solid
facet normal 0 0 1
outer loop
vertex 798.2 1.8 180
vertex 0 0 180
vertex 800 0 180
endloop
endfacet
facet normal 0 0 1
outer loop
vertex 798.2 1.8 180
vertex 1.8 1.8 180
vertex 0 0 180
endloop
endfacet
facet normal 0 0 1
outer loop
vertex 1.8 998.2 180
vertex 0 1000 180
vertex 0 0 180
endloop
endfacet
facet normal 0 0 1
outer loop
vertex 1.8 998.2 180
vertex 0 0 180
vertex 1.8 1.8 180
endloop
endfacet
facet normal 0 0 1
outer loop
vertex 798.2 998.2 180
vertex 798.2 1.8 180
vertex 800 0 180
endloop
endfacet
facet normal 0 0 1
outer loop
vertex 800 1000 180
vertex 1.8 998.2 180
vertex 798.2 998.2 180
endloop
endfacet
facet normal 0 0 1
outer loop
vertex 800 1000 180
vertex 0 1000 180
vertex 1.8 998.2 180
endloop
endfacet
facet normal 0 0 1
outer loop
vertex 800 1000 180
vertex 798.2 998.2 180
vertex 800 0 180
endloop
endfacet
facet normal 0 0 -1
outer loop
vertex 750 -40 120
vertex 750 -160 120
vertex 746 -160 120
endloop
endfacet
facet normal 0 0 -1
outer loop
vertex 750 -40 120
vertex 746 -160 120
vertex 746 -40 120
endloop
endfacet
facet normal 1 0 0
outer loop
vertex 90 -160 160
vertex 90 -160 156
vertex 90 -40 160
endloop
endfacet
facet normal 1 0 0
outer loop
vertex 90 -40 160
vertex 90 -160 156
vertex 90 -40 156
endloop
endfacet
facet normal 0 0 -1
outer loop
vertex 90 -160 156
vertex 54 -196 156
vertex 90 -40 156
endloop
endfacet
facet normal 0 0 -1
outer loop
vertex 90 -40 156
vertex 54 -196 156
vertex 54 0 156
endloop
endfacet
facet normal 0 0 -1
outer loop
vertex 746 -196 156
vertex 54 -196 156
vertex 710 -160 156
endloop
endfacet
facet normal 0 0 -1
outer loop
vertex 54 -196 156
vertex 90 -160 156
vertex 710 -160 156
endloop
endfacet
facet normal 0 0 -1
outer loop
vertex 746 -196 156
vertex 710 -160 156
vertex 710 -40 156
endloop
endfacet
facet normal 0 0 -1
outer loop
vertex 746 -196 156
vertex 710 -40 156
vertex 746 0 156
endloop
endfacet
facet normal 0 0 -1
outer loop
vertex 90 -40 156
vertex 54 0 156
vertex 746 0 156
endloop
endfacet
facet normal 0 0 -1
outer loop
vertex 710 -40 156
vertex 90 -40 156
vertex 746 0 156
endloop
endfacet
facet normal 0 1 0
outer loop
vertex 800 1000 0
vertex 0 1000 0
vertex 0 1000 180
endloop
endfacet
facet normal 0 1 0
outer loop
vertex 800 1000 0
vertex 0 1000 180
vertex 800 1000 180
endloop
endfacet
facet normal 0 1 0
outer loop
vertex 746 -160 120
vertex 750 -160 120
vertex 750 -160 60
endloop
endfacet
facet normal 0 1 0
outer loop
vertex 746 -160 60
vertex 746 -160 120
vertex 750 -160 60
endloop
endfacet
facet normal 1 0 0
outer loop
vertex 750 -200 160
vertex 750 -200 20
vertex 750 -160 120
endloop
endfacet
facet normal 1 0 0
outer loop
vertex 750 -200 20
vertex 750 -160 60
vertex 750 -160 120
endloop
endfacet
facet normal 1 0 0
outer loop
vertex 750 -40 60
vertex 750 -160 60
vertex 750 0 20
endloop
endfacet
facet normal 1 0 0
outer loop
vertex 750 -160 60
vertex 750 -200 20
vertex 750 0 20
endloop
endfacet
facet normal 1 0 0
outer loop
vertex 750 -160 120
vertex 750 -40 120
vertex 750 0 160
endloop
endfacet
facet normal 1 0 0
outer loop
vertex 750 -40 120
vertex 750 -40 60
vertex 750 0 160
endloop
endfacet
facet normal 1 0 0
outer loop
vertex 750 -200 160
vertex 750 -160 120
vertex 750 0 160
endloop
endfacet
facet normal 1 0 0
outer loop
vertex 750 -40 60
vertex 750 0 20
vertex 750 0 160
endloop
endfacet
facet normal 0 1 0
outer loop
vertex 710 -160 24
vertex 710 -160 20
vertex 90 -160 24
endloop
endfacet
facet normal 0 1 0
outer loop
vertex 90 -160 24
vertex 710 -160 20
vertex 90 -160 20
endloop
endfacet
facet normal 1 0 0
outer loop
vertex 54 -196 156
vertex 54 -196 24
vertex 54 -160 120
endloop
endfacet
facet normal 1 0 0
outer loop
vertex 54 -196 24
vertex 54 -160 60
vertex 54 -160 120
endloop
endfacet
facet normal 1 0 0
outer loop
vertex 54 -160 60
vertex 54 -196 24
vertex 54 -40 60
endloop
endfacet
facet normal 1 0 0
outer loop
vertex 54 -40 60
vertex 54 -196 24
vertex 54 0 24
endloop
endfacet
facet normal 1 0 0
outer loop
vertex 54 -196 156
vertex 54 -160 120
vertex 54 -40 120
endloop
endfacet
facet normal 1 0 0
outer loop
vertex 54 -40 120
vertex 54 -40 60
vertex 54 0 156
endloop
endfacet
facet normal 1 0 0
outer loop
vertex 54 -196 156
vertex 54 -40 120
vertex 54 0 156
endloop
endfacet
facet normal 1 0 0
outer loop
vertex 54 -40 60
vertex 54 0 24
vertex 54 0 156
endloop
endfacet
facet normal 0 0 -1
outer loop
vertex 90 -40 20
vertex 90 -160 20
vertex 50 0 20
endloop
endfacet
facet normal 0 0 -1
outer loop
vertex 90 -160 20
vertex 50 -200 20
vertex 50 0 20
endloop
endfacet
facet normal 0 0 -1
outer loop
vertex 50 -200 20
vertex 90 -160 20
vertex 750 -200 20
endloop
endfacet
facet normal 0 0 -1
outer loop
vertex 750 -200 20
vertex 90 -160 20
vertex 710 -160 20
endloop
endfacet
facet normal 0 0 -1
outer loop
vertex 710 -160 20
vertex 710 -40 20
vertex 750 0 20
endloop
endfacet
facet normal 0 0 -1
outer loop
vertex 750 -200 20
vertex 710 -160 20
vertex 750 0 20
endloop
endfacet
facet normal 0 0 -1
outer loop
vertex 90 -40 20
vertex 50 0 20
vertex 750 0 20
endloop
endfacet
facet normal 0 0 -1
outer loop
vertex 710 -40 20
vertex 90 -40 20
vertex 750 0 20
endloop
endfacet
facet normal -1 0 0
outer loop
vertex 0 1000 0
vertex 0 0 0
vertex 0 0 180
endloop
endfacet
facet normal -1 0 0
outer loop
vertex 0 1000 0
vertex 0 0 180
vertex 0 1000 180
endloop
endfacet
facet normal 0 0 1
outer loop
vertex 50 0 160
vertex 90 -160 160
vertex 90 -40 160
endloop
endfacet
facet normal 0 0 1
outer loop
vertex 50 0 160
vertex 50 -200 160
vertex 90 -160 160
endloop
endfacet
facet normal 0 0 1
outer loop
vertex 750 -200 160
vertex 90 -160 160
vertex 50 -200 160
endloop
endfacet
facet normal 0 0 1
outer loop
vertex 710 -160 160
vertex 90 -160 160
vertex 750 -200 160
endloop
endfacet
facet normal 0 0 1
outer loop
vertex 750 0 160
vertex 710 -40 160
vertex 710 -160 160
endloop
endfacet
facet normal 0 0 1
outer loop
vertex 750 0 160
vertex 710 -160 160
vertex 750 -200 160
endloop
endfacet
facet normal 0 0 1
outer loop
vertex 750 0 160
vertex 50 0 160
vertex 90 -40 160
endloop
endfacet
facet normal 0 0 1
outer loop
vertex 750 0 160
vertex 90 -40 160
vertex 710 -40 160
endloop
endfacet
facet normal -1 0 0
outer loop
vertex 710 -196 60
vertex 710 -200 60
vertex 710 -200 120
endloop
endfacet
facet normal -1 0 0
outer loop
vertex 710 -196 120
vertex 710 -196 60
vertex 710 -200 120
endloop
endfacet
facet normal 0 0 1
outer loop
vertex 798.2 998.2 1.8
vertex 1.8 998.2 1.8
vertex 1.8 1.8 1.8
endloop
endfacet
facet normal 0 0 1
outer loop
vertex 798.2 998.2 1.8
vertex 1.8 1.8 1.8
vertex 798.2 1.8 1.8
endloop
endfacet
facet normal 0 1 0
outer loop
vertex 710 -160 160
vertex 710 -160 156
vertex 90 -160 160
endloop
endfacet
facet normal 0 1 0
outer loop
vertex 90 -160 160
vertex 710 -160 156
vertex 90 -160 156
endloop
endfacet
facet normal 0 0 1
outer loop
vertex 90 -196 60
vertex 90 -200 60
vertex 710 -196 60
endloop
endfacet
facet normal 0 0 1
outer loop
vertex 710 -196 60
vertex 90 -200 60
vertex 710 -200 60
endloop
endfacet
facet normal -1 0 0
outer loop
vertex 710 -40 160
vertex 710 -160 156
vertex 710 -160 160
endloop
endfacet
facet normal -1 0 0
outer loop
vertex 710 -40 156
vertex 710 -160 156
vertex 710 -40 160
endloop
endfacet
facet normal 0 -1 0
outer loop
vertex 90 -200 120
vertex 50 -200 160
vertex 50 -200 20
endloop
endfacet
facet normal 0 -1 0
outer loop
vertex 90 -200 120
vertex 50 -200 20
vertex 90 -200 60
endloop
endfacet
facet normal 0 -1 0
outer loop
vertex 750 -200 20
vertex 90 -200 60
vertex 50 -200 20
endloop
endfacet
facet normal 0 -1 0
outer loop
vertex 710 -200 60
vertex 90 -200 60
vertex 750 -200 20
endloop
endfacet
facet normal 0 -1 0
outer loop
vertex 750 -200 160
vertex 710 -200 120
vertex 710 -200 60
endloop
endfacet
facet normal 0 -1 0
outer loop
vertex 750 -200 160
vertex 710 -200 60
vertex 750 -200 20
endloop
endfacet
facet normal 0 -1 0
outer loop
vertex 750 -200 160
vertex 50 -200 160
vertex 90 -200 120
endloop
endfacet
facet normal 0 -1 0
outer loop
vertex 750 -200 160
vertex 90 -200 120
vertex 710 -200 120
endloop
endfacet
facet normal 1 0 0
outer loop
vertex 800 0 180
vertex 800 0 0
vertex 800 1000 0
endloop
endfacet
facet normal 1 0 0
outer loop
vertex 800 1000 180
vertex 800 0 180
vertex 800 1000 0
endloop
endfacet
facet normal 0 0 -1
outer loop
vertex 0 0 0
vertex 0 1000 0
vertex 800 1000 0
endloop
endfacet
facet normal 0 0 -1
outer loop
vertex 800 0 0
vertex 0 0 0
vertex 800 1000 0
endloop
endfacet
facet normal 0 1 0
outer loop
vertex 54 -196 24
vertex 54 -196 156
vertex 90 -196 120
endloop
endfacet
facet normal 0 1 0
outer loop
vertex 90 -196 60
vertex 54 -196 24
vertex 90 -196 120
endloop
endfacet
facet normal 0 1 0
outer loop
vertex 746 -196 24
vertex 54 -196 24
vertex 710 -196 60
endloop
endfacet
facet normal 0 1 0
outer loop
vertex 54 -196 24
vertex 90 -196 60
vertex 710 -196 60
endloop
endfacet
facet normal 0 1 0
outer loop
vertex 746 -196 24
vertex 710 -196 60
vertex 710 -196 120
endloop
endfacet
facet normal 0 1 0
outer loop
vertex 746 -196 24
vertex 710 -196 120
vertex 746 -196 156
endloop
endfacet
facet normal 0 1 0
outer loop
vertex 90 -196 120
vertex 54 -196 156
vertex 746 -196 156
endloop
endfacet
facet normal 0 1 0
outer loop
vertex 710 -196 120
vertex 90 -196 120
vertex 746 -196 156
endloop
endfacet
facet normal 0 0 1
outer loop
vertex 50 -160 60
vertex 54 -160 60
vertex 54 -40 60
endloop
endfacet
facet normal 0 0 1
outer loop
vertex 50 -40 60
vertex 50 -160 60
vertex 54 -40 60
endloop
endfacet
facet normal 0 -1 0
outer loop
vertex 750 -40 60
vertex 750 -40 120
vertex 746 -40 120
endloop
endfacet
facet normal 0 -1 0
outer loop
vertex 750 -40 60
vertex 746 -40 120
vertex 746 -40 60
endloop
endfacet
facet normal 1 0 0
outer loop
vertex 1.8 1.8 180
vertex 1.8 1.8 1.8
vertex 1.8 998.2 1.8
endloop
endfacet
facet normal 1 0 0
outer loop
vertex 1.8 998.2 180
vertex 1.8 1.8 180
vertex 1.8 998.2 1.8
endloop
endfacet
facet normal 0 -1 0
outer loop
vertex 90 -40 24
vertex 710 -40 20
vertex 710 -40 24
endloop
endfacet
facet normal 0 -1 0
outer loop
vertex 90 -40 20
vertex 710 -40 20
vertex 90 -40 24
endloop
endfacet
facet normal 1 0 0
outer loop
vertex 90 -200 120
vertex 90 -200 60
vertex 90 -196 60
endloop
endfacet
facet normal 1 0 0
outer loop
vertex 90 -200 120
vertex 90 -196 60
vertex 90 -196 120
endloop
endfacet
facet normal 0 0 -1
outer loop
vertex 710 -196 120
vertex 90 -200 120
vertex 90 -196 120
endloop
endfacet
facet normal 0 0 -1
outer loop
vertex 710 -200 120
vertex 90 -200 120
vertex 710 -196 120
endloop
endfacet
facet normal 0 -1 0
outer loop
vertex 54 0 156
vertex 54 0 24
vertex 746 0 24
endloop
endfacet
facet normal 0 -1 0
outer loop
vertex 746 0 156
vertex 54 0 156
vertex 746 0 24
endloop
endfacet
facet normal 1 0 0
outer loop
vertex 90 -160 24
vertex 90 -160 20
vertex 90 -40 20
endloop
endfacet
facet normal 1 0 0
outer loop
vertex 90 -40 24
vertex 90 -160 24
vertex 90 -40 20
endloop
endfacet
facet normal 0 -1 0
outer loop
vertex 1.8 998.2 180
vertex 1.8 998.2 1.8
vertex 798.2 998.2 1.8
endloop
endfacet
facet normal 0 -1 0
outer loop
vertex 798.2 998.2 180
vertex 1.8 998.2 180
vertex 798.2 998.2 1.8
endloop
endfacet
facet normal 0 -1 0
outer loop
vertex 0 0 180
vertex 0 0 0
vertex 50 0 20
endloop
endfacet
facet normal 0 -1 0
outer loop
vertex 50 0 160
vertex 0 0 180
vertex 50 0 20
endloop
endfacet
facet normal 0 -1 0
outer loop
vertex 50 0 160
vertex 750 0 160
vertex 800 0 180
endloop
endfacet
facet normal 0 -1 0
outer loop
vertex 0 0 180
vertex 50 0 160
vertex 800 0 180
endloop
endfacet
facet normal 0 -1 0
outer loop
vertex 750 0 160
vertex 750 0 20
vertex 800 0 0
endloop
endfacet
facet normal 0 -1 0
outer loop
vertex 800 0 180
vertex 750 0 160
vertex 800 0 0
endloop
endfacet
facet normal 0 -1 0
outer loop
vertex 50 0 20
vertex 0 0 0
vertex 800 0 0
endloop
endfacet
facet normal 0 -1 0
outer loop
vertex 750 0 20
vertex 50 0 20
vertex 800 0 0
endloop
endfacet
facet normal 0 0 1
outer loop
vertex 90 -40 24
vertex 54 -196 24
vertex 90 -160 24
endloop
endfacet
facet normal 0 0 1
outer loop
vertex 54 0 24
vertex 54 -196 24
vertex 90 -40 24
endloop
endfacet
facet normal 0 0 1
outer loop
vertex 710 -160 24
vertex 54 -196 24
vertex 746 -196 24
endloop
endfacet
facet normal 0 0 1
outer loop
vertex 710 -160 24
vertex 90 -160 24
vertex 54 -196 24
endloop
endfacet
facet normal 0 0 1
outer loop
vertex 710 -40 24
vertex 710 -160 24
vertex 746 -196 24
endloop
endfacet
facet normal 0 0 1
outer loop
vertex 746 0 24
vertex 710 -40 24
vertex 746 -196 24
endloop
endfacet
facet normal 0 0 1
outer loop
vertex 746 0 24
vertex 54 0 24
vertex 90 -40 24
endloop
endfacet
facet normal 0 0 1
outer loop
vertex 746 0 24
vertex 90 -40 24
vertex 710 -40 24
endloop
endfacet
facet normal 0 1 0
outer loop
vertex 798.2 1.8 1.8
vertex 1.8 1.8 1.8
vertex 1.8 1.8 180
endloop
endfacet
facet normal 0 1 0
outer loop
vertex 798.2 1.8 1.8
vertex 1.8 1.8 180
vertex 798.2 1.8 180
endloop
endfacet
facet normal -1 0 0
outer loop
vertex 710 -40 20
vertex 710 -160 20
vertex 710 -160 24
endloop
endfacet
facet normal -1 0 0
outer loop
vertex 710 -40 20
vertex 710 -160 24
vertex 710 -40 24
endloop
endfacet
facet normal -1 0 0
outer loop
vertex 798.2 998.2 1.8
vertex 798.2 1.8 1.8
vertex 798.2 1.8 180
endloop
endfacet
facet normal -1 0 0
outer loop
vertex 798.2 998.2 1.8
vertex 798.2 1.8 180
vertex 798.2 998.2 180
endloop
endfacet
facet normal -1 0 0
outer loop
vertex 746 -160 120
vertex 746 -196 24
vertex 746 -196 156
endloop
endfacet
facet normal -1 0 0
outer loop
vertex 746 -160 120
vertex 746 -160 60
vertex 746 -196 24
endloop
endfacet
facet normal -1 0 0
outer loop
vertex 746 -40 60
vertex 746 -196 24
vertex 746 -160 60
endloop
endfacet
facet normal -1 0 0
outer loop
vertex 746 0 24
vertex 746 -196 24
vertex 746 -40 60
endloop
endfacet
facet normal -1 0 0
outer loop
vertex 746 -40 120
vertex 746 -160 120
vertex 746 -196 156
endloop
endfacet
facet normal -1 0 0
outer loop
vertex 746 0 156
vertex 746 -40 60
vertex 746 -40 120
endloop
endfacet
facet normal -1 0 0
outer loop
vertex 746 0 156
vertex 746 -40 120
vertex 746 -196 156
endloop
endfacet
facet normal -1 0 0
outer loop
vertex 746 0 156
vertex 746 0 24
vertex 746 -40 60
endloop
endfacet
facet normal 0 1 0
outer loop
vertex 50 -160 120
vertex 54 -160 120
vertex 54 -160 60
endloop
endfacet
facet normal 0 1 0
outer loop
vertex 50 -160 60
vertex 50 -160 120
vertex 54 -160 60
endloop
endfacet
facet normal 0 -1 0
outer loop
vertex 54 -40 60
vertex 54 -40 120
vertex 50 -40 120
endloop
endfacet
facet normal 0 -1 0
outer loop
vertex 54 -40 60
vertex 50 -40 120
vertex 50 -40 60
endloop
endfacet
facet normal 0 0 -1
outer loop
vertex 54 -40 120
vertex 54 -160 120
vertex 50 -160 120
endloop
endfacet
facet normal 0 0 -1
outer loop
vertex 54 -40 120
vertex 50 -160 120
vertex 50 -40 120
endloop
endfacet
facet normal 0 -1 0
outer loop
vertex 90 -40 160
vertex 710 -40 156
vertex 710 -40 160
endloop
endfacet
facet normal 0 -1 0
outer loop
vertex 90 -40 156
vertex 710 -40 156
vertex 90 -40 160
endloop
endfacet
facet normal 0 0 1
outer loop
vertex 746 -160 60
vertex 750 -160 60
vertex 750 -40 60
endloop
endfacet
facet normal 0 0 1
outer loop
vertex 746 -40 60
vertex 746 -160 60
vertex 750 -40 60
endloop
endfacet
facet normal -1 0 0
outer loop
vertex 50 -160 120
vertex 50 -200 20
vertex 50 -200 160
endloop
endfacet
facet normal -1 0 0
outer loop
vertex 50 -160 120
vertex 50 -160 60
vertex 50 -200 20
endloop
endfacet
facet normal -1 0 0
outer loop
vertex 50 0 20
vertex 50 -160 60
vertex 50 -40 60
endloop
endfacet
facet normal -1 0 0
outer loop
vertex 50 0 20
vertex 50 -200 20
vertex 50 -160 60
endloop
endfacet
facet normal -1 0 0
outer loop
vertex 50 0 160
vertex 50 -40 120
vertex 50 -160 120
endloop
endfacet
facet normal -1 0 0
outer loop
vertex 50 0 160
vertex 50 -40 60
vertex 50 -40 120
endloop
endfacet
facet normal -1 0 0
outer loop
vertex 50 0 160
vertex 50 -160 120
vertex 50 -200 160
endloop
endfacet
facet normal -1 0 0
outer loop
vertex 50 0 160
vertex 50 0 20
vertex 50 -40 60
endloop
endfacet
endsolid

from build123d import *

# Parameters (mm, degrees)
SKETCH_1_W          = 800
SKETCH_1_H          = 1000
EXTRUDE_1_DEPTH     = 180
SHELL_1_T           = -1.8
SKETCH_2_W          = 700
SKETCH_2_H          = 140
SKETCH_2_W_2        = 692
SKETCH_2_H_2        = 132
EXTRUDE_2_DEPTH     = 200
SKETCH_3_W          = 700
SKETCH_3_H          = 140
SKETCH_3_W_2        = 620
SKETCH_3_H_2        = 60
EXTRUDE_3_DEPTH     = 4
SKETCH_4_W          = 620
SKETCH_4_H          = 120
CUT_EXTRUDE_1_DEPTH = 140
SKETCH_5_W          = 60
SKETCH_5_H          = 120
CUT_EXTRUDE_2_DEPTH = 700


with BuildPart() as part:
    # 草图1 → 凸台-拉伸1 (new body)
    with BuildSketch(Plane.XY):
        with Locations((400, 500)):
            Rectangle(SKETCH_1_W, SKETCH_1_H)
    extrude(amount=EXTRUDE_1_DEPTH)

    # 抽壳1
    shell_1_openings = [part.faces().sort_by_distance(p)[0] for p in [
        (400, 500, 180),
    ]]
    offset(amount=SHELL_1_T, openings=shell_1_openings, kind=Kind.INTERSECTION)

    # 草图2 → 凸台-拉伸2 (add)
    with BuildSketch(Plane.XZ):
        with Locations((400, 90)):
            Rectangle(SKETCH_2_W, SKETCH_2_H)
        with Locations((400, 90)):
            Rectangle(SKETCH_2_W_2, SKETCH_2_H_2, mode=Mode.SUBTRACT)
    extrude(amount=EXTRUDE_2_DEPTH)

    # 草图3 → 凸台-拉伸3 (add)
    with BuildSketch(Plane.XZ.offset(200)):
        with Locations((400, 90)):
            Rectangle(SKETCH_3_W, SKETCH_3_H)
        with Locations((400, 90)):
            Rectangle(SKETCH_3_W_2, SKETCH_3_H_2, mode=Mode.SUBTRACT)
    extrude(amount=-EXTRUDE_3_DEPTH)

    # 草图4 → 切除-拉伸1 (cut)
    with BuildSketch(Plane(origin=(0, 0, 20), x_dir=(-1, 0, 0), z_dir=(0, 0, -1))):
        with Locations((-400, -100)):
            Rectangle(SKETCH_4_W, SKETCH_4_H)
    extrude(amount=-CUT_EXTRUDE_1_DEPTH, mode=Mode.SUBTRACT)

    # 草图5 → 切除-拉伸2 (cut)
    with BuildSketch(Plane(origin=(750, 0, 0), x_dir=(0, 0, -1), z_dir=(1, 0, 0))):
        with Locations((-90, -100)):
            Rectangle(SKETCH_5_W, SKETCH_5_H)
    extrude(amount=-CUT_EXTRUDE_2_DEPTH, mode=Mode.SUBTRACT)


solid = part.part
